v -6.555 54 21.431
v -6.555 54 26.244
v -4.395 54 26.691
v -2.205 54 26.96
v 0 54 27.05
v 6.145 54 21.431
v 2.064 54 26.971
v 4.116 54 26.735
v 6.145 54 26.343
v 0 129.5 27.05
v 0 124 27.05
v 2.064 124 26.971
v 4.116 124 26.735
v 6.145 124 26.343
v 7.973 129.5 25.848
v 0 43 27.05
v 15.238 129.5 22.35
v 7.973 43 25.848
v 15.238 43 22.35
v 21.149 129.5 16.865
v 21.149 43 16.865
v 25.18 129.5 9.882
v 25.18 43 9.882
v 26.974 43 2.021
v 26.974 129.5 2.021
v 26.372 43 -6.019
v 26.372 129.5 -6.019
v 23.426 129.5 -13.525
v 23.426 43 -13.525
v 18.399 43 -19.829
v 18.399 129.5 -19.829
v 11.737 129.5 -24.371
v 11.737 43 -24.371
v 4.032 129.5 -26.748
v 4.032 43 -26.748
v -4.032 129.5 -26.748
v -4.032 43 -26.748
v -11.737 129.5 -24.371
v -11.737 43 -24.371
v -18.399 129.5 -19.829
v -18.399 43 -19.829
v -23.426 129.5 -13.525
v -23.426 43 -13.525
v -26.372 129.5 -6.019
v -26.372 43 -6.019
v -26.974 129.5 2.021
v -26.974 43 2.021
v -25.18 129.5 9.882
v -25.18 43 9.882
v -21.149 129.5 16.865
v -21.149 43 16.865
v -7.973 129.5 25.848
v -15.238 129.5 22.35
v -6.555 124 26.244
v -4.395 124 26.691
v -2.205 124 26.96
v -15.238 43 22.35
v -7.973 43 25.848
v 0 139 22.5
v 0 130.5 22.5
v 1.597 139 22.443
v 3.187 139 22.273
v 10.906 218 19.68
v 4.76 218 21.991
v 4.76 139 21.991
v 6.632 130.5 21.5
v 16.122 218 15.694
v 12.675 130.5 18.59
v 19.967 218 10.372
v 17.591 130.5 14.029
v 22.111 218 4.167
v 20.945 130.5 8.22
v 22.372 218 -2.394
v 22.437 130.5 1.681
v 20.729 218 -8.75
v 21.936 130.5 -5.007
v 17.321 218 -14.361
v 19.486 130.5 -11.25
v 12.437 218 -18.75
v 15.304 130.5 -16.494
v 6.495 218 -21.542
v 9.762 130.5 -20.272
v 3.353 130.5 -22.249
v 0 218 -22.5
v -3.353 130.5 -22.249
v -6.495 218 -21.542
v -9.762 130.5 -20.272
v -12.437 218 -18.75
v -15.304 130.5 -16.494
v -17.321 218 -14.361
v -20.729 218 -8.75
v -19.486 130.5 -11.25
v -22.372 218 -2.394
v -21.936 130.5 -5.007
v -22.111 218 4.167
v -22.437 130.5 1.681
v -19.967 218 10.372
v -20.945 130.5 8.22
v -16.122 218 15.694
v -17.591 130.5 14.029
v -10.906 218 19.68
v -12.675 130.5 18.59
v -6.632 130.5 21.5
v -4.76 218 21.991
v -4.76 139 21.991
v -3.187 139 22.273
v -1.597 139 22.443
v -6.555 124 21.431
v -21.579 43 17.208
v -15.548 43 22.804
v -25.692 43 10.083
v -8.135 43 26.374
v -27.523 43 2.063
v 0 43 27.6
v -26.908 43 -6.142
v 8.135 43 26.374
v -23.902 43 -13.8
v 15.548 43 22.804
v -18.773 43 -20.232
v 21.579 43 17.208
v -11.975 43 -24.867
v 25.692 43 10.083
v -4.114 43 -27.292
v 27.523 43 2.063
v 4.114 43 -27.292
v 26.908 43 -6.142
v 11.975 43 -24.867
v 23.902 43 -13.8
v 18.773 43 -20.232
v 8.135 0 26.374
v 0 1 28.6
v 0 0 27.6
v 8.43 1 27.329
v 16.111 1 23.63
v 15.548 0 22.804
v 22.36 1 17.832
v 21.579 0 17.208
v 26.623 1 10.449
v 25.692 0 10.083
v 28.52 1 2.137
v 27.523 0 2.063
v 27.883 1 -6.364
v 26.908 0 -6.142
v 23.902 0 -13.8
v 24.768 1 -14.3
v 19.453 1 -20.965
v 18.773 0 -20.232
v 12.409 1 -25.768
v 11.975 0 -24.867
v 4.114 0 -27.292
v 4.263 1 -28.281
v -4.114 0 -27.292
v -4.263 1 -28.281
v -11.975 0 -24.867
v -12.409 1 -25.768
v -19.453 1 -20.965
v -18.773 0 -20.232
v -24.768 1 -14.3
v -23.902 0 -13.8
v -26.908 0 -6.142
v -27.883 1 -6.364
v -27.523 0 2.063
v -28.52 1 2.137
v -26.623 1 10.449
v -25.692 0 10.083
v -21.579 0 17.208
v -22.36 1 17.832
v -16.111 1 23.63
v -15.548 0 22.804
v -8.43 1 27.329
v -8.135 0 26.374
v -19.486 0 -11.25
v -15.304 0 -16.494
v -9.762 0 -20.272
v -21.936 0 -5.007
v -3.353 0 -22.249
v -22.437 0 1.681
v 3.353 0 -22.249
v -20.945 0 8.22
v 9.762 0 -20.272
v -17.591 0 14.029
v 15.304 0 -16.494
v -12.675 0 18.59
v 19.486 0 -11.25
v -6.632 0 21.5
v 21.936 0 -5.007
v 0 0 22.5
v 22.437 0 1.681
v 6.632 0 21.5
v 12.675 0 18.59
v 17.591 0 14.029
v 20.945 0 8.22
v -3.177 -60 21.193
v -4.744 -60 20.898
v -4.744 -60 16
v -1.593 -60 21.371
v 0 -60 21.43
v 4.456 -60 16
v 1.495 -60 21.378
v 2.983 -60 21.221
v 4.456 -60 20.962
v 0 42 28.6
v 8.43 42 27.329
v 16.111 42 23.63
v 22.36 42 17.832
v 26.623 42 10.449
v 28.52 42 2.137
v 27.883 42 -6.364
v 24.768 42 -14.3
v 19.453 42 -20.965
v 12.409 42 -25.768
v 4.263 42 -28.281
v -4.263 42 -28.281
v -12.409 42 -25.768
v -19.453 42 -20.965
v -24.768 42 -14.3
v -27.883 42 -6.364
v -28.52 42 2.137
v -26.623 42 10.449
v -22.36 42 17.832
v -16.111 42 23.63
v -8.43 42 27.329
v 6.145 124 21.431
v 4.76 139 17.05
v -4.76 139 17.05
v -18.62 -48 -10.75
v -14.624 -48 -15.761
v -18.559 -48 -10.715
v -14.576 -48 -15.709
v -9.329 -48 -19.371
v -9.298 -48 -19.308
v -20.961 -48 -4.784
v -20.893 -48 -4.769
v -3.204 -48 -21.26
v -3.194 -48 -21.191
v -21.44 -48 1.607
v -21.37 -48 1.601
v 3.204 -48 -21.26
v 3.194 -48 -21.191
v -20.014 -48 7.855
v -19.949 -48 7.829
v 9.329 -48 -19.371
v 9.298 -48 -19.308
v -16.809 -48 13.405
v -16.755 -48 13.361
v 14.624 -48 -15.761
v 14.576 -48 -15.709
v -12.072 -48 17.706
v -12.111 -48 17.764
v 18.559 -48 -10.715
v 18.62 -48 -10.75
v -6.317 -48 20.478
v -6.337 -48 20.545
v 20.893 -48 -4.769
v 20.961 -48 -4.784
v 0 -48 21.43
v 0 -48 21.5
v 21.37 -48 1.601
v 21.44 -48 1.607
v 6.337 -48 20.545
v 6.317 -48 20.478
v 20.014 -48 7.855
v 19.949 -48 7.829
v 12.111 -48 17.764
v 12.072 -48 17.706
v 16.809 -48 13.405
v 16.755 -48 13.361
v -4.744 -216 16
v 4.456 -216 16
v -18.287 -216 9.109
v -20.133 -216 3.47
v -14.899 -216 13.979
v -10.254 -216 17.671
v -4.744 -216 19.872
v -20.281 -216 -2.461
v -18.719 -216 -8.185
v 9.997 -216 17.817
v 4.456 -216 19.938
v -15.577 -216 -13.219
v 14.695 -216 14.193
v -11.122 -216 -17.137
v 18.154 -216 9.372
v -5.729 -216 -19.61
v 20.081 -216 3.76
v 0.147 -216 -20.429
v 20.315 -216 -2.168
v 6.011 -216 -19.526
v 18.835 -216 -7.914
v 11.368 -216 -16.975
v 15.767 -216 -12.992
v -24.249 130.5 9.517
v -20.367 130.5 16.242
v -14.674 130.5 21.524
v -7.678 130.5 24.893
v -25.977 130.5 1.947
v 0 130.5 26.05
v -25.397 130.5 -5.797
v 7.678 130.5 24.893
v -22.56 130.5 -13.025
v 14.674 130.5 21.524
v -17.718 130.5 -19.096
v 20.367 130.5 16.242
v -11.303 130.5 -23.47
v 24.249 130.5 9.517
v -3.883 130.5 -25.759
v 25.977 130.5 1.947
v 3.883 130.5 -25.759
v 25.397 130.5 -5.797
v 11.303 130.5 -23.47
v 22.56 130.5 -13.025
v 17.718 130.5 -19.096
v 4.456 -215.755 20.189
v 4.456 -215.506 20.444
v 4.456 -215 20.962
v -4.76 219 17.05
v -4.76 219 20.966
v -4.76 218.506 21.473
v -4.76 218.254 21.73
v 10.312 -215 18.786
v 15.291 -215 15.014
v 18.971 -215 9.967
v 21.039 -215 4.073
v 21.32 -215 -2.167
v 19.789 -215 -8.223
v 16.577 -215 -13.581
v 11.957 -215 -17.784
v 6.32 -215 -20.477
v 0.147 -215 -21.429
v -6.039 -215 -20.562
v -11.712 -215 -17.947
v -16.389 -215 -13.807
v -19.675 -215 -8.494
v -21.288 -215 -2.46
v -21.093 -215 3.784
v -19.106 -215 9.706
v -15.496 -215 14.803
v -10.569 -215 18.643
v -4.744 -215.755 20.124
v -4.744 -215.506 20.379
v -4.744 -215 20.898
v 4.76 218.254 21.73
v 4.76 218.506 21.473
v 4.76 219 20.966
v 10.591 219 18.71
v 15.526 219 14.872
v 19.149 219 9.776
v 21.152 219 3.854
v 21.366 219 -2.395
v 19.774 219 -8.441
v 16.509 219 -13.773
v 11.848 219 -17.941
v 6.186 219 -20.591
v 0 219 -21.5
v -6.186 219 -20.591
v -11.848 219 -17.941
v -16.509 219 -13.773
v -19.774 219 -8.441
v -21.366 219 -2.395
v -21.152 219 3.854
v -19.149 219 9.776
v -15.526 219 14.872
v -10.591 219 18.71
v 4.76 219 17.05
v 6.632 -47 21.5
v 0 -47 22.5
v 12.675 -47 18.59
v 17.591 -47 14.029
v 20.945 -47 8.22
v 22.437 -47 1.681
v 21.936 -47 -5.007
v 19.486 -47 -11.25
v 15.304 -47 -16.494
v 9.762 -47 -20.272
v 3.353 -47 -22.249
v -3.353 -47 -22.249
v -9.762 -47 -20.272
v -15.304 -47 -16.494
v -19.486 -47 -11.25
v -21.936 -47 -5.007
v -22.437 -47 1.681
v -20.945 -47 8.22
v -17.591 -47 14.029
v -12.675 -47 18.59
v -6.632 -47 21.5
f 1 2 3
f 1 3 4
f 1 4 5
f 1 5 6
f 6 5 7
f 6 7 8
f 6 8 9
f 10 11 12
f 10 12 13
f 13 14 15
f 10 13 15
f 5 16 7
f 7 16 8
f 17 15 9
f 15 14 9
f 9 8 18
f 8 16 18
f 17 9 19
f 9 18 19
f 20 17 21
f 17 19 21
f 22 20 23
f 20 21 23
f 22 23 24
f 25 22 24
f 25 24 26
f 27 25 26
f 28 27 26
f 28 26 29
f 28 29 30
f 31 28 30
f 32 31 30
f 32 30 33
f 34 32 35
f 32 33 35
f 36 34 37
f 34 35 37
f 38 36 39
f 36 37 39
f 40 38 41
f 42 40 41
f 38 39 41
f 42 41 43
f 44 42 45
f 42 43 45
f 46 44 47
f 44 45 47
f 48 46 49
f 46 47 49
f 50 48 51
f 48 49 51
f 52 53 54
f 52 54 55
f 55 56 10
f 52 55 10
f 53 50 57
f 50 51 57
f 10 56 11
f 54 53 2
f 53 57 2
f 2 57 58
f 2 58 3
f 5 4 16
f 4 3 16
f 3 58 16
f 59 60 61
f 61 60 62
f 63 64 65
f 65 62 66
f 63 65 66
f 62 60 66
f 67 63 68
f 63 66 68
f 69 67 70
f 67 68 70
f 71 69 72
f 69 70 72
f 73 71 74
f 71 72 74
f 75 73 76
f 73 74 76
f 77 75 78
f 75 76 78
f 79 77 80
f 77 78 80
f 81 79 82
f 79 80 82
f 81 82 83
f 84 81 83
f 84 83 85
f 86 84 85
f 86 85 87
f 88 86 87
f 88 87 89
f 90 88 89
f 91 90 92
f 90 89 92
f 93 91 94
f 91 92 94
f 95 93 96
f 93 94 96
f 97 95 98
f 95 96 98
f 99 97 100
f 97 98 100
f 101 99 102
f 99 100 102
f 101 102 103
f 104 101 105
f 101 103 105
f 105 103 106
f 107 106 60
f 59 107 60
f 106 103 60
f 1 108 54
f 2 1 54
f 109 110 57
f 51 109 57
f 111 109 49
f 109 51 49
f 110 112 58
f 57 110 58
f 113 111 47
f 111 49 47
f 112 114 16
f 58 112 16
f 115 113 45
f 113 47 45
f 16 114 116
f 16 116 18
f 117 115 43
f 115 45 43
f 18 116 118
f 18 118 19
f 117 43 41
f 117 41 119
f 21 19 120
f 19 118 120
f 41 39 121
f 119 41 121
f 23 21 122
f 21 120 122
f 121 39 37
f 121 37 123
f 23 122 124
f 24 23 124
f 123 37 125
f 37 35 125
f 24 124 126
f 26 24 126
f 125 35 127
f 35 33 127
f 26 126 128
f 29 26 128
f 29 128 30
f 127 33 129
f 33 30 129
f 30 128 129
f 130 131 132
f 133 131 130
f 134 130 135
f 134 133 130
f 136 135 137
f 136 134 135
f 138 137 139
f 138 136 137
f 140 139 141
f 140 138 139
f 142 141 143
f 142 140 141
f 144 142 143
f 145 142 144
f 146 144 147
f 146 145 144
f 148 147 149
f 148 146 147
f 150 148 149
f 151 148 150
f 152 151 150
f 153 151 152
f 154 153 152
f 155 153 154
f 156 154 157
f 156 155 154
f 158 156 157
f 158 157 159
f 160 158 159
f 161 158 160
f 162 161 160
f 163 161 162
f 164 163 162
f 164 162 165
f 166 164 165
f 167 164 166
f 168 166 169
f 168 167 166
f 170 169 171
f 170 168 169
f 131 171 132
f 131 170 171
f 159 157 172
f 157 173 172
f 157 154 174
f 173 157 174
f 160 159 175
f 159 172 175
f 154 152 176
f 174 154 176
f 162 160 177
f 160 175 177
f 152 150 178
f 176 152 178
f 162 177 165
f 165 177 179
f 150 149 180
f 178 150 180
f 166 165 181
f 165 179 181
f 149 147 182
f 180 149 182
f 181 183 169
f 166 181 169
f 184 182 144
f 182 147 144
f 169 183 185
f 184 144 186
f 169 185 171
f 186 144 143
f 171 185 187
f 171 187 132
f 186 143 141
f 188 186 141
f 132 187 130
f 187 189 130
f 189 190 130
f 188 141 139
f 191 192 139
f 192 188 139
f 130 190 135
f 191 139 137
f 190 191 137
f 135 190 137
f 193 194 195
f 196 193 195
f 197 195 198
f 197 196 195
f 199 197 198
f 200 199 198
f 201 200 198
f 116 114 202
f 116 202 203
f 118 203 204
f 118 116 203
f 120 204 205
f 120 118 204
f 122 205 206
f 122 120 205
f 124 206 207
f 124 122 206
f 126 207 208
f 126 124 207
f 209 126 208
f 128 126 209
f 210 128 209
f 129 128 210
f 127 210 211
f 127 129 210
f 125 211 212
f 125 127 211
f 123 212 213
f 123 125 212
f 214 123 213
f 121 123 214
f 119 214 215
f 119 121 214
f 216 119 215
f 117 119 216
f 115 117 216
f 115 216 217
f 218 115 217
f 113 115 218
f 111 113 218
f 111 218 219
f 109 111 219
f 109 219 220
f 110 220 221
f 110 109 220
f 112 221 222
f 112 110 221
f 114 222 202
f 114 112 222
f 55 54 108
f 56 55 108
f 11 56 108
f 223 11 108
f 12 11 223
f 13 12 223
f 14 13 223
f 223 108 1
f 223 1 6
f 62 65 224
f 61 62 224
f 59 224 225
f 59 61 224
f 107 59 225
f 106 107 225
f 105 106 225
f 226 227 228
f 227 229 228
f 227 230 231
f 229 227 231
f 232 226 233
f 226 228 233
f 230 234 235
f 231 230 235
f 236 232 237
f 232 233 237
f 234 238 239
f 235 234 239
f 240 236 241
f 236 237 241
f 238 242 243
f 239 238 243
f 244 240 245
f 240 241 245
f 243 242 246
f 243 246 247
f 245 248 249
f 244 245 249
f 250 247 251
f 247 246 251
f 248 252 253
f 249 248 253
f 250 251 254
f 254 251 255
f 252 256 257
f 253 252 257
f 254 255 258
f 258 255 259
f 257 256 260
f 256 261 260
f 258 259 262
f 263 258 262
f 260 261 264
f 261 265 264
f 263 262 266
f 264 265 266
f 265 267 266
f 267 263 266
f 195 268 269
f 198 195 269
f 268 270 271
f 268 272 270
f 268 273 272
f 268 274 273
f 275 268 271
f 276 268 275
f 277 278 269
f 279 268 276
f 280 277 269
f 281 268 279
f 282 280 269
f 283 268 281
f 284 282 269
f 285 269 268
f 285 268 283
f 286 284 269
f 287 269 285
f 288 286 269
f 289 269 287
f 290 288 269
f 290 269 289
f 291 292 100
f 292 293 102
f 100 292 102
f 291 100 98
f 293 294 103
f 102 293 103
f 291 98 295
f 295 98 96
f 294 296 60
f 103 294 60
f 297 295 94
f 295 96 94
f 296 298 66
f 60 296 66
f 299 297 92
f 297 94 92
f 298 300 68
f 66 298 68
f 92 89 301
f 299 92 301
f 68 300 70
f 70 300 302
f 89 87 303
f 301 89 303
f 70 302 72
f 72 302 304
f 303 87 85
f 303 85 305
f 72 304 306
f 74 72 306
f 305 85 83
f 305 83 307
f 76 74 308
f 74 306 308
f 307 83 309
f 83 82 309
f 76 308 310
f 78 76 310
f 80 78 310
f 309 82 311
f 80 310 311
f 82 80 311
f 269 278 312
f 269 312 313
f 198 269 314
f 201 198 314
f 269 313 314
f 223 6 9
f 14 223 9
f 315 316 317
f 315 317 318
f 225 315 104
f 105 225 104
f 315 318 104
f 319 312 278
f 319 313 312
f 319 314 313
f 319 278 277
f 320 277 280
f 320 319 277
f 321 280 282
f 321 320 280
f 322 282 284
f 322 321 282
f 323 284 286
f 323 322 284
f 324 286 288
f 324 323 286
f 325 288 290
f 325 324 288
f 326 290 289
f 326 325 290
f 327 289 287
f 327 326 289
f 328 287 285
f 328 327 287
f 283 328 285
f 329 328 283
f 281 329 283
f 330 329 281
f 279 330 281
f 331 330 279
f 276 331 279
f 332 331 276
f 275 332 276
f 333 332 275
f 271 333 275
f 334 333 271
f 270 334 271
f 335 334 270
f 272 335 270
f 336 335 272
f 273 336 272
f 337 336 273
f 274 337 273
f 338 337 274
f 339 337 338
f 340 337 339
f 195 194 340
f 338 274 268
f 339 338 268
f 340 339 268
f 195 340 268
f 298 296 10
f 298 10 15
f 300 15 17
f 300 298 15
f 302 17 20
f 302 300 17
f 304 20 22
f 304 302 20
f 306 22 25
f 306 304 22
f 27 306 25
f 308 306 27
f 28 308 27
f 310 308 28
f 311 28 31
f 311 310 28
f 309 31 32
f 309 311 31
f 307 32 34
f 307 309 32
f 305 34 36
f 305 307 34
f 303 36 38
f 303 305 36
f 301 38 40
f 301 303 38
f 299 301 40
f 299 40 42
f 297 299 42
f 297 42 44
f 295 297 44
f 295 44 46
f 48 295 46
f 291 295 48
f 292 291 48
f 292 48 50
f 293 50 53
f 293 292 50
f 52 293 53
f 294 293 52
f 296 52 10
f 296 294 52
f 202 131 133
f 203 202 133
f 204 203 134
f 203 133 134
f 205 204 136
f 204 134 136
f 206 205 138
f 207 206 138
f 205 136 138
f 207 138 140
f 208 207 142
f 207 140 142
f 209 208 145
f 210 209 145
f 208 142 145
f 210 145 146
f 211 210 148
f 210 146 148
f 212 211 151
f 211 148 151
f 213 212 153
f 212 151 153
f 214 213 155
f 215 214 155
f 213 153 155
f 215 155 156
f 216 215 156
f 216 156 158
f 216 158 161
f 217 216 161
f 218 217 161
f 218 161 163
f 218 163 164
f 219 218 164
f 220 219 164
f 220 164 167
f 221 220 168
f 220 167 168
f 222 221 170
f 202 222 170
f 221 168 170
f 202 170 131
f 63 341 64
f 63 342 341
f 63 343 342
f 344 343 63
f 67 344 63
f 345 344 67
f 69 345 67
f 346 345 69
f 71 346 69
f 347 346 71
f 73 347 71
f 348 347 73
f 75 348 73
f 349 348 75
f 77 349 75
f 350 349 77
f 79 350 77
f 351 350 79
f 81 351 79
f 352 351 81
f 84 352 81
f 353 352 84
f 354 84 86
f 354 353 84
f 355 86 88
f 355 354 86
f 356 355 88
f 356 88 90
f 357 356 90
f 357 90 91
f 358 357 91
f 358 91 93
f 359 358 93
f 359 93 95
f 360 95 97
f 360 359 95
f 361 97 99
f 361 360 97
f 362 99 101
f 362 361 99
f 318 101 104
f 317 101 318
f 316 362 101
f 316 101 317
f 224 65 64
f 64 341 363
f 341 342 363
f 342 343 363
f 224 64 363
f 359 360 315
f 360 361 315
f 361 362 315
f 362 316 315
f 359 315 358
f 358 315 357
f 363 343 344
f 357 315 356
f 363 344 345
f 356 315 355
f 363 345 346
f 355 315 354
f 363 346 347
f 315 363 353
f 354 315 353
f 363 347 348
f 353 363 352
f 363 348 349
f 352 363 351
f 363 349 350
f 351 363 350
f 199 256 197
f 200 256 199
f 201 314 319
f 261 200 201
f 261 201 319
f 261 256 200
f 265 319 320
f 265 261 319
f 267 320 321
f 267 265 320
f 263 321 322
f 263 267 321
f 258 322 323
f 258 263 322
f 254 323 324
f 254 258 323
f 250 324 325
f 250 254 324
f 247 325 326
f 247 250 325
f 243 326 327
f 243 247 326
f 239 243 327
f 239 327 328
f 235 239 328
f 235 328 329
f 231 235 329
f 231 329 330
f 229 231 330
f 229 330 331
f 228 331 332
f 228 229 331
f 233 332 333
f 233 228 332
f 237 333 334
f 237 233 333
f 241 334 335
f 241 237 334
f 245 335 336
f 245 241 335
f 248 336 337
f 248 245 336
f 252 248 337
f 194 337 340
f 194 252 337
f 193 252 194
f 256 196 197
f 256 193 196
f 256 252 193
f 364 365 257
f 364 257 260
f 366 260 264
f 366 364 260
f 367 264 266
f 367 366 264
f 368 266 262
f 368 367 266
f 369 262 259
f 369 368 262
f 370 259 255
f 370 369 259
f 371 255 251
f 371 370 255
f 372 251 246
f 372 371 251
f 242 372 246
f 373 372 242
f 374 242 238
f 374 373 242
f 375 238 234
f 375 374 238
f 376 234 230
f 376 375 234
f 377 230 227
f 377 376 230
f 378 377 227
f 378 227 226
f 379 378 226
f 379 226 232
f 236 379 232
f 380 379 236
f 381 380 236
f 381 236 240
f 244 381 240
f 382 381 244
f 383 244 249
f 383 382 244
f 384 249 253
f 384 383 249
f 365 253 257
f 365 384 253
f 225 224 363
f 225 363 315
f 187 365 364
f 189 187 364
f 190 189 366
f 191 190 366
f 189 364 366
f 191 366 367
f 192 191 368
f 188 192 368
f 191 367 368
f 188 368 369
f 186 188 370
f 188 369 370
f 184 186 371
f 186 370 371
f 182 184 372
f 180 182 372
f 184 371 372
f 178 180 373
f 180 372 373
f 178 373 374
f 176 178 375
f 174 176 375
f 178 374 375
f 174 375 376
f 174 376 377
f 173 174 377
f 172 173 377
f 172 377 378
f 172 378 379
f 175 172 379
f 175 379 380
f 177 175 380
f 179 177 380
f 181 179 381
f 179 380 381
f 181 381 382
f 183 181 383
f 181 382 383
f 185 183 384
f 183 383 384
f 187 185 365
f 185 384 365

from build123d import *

# Parameters (mm, degrees)
F0_W     = 168
F0_H     = 21.43
F0_W_2   = 44.5
F0_H_2   = 22.5
F0_W_3   = 44
F3_DEPTH = 156
F5_W     = 12.7
F5_H     = 7
F6_DEPTH = 70
F8_DEPTH = 80
F9_SIZE  = 1
F10_SIZE = 1
F11_SIZE = 1
F12_SIZE = 1


with BuildPart() as f1:
    # F0 (on Right) → F1 (revolve)
    with BuildSketch(Plane.YZ):
        with Locations((-132, 10.715)):
            Rectangle(F0_W, F0_H)
        Polygon((-48, 21.43), (-48, 0), (0, 0), (0, 22.5), (-48, 22.5), align=None)
        Polygon((0, 22.5), (0, 0), (43, 0), (43, 27.05), (43, 28.6), (0, 28.6), align=None)
        Polygon((43, 27.05), (43, 0), (130.5, 0), (130.5, 22.5), (130.5, 27.05), align=None)
        with Locations((152.75, 11.25)):
            Rectangle(F0_W_2, F0_H_2)
        with Locations((197, 11.25)):
            Rectangle(F0_W_3, F0_H_2)
    revolve(axis=Axis((0, 197, 0), (0, 1, 0)))

    # F2 (on face) → F3 (cut)
    with BuildSketch(Plane.XZ.offset(216)):
        with BuildLine():
            Line((-4.7436739586, 16), (4.4563260414, 16))
            Line((4.4563260414, 16), (4.4563260414, 20.9615375918))
            ThreePointArc((4.4563260414, 20.9615375918), (-0.1471030174, 21.4294951108), (-4.7436739586, 20.8983840852))
            Line((-4.7436739586, 20.8983840852), (-4.7436739586, 16))
        make_face()
    extrude(amount=-F3_DEPTH, mode=Mode.SUBTRACT)

    # F5 (on offset) → F6 (cut)
    with BuildSketch(Plane.XZ.offset(-54)):
        with Locations((-0.2053595381, 24.9309174805)):
            Rectangle(F5_W, F5_H)
    extrude(amount=-F6_DEPTH, mode=Mode.SUBTRACT)

    # F7 (on face) → F8 (cut)
    with BuildSketch(Plane(origin=(0, 219, 0), x_dir=(-1, 0, 0), z_dir=(0, 1, 0))):
        with BuildLine():
            ThreePointArc((4.76, 21.9907344125), (0, 22.5), (-4.76, 21.9907344125))
            Line((-4.76, 21.9907344125), (-4.76, 17.0498597833))
            Line((-4.76, 17.0498597833), (4.76, 17.0498597833))
            Line((4.76, 17.0498597833), (4.76, 21.9907344125))
        make_face()
    extrude(amount=-F8_DEPTH, mode=Mode.SUBTRACT)

    # F9
    f9_edges = [f1.edges().sort_by_distance(p)[0] for p in [
        (0.147103, -216, -21.429495),
    ]]
    chamfer(f9_edges, length=F9_SIZE)

    # F10
    f10_edges = [f1.edges().sort_by_distance(p)[0] for p in [
        (0, -48, -22.5),
    ]]
    chamfer(f10_edges, length=F10_SIZE)

    # F11
    f11_edges = [f1.edges().sort_by_distance(p)[0] for p in [
        (0, 0, -28.6),
        (0, 43, -28.6),
    ]]
    chamfer(f11_edges, length=F11_SIZE)

    # F12
    f12_edges = [f1.edges().sort_by_distance(p)[0] for p in [
        (0, 130.5, -27.05),
        (0, 219, -22.5),
    ]]
    chamfer(f12_edges, length=F12_SIZE)


solid = f1.part
